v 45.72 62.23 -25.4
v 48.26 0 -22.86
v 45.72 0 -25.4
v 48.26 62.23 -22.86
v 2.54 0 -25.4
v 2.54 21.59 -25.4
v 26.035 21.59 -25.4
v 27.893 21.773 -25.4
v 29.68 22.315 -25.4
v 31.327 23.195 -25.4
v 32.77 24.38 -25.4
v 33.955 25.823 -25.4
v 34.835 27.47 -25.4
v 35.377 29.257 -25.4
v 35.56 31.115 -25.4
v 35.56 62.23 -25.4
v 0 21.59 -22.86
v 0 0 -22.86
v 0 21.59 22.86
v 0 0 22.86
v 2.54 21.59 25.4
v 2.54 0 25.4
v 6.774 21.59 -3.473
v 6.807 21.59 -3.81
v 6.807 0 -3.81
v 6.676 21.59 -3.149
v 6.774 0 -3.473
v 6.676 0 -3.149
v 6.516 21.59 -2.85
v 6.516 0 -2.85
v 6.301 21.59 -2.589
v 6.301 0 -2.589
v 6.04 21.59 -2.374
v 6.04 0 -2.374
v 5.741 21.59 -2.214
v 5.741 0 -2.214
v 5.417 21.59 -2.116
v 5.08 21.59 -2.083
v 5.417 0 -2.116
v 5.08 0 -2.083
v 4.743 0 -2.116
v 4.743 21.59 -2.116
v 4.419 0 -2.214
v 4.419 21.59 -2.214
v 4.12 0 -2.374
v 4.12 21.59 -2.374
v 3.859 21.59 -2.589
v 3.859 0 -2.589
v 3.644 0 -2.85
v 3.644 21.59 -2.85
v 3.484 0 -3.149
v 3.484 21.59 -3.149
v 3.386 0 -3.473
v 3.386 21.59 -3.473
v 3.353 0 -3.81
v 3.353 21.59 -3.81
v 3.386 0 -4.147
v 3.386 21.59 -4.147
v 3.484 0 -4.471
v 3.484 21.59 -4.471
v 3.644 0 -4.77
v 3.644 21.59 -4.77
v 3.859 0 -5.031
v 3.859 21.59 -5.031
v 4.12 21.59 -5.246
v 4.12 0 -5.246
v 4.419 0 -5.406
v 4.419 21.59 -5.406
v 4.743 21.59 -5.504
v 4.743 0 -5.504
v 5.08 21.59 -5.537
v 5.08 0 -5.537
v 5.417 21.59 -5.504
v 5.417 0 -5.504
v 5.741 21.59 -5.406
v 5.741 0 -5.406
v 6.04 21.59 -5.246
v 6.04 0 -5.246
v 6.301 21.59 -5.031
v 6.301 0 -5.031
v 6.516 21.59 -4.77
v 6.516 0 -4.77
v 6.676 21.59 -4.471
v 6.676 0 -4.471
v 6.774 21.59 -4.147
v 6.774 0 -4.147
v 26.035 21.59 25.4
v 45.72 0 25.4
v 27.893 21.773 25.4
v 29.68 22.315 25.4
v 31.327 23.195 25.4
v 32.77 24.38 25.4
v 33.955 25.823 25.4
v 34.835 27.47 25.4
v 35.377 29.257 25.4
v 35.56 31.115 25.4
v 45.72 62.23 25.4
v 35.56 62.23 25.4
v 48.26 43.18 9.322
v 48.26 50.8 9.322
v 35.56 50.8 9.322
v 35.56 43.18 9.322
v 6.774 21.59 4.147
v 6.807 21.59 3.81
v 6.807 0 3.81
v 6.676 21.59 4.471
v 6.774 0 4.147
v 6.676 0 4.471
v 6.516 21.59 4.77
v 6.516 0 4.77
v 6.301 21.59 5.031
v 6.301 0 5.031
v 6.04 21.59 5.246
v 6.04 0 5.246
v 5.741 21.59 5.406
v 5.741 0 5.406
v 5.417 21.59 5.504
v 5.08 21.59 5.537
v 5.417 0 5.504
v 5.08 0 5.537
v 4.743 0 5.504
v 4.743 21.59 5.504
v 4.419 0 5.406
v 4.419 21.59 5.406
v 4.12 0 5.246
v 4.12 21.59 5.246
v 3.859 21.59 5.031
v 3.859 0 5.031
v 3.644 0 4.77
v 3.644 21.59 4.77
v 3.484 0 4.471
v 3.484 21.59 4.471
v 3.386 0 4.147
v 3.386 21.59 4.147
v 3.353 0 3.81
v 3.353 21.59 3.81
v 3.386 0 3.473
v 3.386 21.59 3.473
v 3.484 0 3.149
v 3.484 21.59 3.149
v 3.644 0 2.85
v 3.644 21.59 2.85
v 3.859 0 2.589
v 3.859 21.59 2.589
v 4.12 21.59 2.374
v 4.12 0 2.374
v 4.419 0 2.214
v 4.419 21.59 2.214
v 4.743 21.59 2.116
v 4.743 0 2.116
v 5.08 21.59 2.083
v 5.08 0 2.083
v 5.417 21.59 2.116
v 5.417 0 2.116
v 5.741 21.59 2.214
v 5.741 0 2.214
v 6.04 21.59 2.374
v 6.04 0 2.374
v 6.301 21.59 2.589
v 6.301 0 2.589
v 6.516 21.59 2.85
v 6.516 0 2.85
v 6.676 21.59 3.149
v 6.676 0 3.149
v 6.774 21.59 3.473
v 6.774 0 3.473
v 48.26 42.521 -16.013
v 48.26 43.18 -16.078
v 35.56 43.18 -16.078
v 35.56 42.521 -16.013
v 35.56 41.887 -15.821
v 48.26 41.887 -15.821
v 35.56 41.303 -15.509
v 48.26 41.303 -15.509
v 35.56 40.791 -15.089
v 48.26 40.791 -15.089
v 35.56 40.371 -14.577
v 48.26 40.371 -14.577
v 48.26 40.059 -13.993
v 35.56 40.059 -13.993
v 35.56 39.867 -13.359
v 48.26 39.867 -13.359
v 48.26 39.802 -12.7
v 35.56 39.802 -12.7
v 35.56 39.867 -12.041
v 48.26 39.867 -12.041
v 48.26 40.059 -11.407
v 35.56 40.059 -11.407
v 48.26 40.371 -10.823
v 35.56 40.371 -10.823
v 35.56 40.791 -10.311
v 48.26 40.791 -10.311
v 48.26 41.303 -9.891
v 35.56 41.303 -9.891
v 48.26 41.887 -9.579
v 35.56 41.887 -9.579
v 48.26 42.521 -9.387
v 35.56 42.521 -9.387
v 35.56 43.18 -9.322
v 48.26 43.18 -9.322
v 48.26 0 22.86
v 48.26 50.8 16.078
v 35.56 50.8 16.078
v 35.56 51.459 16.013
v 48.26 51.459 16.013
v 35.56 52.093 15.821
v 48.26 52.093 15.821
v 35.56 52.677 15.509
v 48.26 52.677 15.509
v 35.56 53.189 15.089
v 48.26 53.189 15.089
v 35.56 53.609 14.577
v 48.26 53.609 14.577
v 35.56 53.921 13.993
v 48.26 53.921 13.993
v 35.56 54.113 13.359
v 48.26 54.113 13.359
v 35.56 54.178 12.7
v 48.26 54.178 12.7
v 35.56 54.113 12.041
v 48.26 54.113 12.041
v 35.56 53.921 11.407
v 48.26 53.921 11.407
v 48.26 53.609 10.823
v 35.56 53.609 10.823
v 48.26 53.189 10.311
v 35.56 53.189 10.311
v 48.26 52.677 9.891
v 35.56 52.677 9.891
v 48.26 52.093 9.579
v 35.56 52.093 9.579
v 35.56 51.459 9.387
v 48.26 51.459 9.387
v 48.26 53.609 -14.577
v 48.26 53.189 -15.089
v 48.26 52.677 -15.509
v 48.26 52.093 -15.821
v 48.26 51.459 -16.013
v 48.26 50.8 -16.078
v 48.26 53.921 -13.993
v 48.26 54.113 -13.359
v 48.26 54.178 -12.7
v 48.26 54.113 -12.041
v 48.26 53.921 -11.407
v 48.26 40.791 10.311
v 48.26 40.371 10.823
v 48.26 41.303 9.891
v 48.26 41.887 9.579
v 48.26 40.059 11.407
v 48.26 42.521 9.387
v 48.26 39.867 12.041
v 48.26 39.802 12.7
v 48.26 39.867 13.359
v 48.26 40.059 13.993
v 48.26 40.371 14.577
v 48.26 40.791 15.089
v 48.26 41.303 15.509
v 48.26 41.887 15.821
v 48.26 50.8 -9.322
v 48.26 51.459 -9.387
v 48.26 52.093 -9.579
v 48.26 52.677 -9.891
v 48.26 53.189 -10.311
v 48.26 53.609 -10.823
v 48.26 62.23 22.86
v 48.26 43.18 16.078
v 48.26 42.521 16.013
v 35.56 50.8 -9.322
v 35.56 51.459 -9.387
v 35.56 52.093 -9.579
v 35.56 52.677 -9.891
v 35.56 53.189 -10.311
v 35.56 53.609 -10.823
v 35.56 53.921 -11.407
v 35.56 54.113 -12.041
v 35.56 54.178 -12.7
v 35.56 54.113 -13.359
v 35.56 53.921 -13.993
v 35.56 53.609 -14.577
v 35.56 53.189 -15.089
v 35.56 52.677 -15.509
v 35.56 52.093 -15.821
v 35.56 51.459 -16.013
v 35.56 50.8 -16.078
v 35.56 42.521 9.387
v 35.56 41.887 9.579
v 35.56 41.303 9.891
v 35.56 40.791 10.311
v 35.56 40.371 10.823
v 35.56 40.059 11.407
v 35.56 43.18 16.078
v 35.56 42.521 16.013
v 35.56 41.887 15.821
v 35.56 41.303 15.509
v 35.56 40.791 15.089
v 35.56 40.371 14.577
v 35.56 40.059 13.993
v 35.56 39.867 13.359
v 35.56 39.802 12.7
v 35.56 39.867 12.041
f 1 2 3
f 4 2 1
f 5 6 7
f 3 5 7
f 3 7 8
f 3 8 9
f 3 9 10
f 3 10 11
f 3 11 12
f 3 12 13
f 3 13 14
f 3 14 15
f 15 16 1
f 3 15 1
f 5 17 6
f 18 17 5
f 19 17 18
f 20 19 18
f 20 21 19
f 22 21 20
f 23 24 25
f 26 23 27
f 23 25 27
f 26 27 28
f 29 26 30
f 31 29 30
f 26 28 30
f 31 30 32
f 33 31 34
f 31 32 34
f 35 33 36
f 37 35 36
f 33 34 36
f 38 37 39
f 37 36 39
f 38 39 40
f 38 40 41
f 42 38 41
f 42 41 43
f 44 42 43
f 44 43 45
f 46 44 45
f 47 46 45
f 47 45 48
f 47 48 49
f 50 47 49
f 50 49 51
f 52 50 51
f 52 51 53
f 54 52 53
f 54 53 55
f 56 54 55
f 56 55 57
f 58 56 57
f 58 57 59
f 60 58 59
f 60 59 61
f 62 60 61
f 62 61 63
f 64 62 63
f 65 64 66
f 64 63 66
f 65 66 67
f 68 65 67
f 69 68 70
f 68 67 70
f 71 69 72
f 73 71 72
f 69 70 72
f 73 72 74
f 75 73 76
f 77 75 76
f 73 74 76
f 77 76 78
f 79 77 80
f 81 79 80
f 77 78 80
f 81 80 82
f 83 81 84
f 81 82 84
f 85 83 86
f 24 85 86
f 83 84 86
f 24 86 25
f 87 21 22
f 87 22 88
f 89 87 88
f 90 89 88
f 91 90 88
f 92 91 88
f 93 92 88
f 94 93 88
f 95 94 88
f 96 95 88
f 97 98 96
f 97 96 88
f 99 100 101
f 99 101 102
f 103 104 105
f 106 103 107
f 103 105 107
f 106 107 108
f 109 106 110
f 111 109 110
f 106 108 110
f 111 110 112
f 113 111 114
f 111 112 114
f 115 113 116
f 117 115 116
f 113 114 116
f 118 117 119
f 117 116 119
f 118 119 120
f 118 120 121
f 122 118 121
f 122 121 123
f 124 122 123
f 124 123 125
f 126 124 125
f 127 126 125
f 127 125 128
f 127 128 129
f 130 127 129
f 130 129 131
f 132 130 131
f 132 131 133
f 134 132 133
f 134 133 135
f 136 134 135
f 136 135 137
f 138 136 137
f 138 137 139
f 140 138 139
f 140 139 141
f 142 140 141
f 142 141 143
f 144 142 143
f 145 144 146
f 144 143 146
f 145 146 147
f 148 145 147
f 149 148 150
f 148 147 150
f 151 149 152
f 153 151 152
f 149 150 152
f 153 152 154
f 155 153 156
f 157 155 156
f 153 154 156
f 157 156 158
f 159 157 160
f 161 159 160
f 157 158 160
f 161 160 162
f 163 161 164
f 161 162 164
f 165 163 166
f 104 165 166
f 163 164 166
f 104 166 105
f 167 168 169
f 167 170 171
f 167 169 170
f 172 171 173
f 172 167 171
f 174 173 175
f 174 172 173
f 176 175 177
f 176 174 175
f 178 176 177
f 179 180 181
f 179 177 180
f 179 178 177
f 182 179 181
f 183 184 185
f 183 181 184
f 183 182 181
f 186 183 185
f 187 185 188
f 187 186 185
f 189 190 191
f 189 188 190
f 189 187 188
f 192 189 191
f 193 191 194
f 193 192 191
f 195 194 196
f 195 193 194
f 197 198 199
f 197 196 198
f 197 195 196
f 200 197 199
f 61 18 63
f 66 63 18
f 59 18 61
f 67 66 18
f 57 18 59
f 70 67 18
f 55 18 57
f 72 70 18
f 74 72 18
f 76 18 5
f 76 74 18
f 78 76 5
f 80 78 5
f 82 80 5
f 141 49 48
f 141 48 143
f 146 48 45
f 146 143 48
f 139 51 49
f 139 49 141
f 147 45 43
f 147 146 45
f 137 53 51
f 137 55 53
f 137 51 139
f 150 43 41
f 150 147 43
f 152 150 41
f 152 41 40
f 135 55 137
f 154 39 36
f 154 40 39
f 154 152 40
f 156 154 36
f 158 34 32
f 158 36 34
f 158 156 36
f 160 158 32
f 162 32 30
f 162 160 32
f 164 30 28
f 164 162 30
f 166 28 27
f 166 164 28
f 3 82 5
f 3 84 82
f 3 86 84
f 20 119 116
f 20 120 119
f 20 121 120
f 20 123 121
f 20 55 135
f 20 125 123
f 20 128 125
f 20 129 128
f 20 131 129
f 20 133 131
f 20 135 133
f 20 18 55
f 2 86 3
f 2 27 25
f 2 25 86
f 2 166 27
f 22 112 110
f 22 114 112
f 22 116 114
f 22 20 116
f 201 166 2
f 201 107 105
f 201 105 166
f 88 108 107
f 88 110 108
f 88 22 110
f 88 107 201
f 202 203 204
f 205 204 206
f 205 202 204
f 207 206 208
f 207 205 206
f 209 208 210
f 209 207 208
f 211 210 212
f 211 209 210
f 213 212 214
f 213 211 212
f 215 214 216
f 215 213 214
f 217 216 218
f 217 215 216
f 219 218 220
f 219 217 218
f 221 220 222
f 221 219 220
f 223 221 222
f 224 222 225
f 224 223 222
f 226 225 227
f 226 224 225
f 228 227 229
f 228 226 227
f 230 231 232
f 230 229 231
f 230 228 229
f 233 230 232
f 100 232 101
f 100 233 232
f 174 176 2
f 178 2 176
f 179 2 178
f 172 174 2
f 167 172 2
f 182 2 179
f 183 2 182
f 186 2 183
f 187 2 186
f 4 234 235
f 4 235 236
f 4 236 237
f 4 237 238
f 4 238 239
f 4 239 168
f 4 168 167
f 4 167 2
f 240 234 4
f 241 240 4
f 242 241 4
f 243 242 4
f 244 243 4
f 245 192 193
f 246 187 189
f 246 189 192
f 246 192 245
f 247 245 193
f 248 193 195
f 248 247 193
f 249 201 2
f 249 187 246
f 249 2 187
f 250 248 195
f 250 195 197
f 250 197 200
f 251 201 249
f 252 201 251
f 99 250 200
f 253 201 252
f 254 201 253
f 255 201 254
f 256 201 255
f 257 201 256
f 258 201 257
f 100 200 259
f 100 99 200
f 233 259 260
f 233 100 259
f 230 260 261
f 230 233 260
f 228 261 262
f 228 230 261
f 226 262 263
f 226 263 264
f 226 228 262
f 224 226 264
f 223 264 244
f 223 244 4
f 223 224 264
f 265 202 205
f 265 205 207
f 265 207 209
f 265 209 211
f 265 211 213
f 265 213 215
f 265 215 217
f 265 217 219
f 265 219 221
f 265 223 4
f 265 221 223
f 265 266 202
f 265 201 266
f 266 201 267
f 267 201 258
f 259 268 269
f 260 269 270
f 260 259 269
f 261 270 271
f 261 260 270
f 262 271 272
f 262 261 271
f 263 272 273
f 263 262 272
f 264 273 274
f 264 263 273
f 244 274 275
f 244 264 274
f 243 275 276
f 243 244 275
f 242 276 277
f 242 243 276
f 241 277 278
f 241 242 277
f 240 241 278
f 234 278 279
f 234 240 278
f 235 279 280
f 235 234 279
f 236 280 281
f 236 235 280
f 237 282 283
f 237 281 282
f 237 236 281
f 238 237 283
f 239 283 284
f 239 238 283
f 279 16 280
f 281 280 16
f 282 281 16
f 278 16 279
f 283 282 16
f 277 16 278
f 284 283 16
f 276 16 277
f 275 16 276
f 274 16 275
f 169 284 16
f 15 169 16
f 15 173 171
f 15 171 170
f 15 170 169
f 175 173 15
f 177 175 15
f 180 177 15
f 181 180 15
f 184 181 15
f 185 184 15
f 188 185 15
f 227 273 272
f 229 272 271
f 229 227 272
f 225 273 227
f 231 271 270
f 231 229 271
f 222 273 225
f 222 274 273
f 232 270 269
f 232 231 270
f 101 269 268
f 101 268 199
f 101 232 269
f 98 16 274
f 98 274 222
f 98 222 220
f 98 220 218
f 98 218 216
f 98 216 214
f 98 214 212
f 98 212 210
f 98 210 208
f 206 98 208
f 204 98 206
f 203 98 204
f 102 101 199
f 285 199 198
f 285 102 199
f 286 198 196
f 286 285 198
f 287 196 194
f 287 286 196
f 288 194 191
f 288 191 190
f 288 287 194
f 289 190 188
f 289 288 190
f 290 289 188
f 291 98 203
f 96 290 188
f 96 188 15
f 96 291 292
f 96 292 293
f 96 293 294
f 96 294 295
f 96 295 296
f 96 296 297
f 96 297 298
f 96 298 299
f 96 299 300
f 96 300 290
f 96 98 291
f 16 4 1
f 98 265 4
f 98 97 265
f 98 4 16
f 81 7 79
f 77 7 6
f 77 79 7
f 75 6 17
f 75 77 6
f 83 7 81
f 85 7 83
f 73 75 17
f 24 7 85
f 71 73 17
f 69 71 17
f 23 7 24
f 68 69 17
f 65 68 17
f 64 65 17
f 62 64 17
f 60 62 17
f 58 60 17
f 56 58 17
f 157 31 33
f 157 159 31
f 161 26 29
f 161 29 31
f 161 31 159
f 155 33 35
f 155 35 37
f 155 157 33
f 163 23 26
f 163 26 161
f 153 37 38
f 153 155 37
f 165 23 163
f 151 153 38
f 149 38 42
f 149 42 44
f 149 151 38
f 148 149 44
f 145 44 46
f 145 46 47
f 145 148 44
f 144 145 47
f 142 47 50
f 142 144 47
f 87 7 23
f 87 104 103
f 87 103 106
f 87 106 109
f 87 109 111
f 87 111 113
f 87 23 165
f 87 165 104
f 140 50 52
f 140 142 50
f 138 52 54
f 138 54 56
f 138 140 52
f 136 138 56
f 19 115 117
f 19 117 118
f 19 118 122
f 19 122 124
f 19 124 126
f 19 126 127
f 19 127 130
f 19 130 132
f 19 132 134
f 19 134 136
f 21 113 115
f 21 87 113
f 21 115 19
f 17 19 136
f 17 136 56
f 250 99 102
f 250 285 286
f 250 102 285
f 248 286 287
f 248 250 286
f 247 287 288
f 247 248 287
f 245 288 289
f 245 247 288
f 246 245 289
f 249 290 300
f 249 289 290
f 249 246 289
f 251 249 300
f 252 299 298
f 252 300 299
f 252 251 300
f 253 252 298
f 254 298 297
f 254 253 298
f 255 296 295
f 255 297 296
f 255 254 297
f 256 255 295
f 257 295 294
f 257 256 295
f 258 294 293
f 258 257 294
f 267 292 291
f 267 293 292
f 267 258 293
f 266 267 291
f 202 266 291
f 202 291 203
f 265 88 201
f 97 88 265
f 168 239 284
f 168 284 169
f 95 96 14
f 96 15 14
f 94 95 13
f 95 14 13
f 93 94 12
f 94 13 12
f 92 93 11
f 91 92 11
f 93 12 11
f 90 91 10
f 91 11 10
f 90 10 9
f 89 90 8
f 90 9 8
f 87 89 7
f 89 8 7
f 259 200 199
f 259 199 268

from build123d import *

# Parameters (mm, degrees)
EXTRUDE1_DEPTH        = 25.4
EXTRUDE1_DEPTH_BACK   = 25.4
F_4_CLEARANCE_HOLE1_D = 3.4544
EXTRUDE2_DEPTH        = 49.26
LPATTERN1_COUNT       = 2
LPATTERN1_PITCH       = 25.4
FILLET2_R             = 9.525
CHAMFER1_SIZE         = 2.54


with BuildPart() as part:
    # Sketch1 → Extrude1 (new body, two sides)
    with BuildSketch(Plane.XY) as extrude1_sk:
        Polygon((0, 0), (48.26, 0), (48.26, 62.23), (35.56, 62.23), (35.56, 21.59), (0, 21.59), align=None)
    extrude(amount=EXTRUDE1_DEPTH)
    extrude(extrude1_sk.sketch, amount=-EXTRUDE1_DEPTH_BACK)

    # 4 Clearance Hole1 (through all)
    with Locations(Plane(origin=(0, 21.59, 0), x_dir=(-1, 0, 0), z_dir=(0, 1, 0))):
        with Locations((-5.08, -3.81), (-5.08, 3.81)):
            Hole(F_4_CLEARANCE_HOLE1_D / 2)

    # Sketch4 → Extrude2 (cut, through all)
    with BuildSketch(Plane(origin=(48.26, 0, 0), x_dir=(0, 0, -1), z_dir=(1, 0, 0))):
        with BuildLine():
            Line((16.0782, 50.8), (16.0782, 43.18))
            ThreePointArc((16.0782, 43.18), (12.7, 39.8018), (9.3218, 43.18))
            Line((9.3218, 43.18), (9.3218, 50.8))
            ThreePointArc((9.3218, 50.8), (12.7, 54.1782), (16.0782, 50.8))
        make_face()
    extrude2 = extrude(amount=-EXTRUDE2_DEPTH, mode=Mode.SUBTRACT)

    # LPattern1: Extrude2 ×2
    with Locations(*[(0, 0, i * LPATTERN1_PITCH) for i in range(1, LPATTERN1_COUNT)]):
        add(extrude2, mode=Mode.SUBTRACT)

    # Fillet2
    fillet2_edges = [part.edges().sort_by_distance(p)[0] for p in [
        (35.56, 21.59, 0),
    ]]
    fillet(fillet2_edges, radius=FILLET2_R)

    # Chamfer1
    chamfer1_edges = [part.edges().sort_by_distance(p)[0] for p in [
        (48.26, 31.115, -25.4),
        (0, 10.795, 25.4),
        (48.26, 31.115, 25.4),
        (0, 10.795, -25.4),
    ]]
    chamfer(chamfer1_edges, length=CHAMFER1_SIZE)


solid = part.part
